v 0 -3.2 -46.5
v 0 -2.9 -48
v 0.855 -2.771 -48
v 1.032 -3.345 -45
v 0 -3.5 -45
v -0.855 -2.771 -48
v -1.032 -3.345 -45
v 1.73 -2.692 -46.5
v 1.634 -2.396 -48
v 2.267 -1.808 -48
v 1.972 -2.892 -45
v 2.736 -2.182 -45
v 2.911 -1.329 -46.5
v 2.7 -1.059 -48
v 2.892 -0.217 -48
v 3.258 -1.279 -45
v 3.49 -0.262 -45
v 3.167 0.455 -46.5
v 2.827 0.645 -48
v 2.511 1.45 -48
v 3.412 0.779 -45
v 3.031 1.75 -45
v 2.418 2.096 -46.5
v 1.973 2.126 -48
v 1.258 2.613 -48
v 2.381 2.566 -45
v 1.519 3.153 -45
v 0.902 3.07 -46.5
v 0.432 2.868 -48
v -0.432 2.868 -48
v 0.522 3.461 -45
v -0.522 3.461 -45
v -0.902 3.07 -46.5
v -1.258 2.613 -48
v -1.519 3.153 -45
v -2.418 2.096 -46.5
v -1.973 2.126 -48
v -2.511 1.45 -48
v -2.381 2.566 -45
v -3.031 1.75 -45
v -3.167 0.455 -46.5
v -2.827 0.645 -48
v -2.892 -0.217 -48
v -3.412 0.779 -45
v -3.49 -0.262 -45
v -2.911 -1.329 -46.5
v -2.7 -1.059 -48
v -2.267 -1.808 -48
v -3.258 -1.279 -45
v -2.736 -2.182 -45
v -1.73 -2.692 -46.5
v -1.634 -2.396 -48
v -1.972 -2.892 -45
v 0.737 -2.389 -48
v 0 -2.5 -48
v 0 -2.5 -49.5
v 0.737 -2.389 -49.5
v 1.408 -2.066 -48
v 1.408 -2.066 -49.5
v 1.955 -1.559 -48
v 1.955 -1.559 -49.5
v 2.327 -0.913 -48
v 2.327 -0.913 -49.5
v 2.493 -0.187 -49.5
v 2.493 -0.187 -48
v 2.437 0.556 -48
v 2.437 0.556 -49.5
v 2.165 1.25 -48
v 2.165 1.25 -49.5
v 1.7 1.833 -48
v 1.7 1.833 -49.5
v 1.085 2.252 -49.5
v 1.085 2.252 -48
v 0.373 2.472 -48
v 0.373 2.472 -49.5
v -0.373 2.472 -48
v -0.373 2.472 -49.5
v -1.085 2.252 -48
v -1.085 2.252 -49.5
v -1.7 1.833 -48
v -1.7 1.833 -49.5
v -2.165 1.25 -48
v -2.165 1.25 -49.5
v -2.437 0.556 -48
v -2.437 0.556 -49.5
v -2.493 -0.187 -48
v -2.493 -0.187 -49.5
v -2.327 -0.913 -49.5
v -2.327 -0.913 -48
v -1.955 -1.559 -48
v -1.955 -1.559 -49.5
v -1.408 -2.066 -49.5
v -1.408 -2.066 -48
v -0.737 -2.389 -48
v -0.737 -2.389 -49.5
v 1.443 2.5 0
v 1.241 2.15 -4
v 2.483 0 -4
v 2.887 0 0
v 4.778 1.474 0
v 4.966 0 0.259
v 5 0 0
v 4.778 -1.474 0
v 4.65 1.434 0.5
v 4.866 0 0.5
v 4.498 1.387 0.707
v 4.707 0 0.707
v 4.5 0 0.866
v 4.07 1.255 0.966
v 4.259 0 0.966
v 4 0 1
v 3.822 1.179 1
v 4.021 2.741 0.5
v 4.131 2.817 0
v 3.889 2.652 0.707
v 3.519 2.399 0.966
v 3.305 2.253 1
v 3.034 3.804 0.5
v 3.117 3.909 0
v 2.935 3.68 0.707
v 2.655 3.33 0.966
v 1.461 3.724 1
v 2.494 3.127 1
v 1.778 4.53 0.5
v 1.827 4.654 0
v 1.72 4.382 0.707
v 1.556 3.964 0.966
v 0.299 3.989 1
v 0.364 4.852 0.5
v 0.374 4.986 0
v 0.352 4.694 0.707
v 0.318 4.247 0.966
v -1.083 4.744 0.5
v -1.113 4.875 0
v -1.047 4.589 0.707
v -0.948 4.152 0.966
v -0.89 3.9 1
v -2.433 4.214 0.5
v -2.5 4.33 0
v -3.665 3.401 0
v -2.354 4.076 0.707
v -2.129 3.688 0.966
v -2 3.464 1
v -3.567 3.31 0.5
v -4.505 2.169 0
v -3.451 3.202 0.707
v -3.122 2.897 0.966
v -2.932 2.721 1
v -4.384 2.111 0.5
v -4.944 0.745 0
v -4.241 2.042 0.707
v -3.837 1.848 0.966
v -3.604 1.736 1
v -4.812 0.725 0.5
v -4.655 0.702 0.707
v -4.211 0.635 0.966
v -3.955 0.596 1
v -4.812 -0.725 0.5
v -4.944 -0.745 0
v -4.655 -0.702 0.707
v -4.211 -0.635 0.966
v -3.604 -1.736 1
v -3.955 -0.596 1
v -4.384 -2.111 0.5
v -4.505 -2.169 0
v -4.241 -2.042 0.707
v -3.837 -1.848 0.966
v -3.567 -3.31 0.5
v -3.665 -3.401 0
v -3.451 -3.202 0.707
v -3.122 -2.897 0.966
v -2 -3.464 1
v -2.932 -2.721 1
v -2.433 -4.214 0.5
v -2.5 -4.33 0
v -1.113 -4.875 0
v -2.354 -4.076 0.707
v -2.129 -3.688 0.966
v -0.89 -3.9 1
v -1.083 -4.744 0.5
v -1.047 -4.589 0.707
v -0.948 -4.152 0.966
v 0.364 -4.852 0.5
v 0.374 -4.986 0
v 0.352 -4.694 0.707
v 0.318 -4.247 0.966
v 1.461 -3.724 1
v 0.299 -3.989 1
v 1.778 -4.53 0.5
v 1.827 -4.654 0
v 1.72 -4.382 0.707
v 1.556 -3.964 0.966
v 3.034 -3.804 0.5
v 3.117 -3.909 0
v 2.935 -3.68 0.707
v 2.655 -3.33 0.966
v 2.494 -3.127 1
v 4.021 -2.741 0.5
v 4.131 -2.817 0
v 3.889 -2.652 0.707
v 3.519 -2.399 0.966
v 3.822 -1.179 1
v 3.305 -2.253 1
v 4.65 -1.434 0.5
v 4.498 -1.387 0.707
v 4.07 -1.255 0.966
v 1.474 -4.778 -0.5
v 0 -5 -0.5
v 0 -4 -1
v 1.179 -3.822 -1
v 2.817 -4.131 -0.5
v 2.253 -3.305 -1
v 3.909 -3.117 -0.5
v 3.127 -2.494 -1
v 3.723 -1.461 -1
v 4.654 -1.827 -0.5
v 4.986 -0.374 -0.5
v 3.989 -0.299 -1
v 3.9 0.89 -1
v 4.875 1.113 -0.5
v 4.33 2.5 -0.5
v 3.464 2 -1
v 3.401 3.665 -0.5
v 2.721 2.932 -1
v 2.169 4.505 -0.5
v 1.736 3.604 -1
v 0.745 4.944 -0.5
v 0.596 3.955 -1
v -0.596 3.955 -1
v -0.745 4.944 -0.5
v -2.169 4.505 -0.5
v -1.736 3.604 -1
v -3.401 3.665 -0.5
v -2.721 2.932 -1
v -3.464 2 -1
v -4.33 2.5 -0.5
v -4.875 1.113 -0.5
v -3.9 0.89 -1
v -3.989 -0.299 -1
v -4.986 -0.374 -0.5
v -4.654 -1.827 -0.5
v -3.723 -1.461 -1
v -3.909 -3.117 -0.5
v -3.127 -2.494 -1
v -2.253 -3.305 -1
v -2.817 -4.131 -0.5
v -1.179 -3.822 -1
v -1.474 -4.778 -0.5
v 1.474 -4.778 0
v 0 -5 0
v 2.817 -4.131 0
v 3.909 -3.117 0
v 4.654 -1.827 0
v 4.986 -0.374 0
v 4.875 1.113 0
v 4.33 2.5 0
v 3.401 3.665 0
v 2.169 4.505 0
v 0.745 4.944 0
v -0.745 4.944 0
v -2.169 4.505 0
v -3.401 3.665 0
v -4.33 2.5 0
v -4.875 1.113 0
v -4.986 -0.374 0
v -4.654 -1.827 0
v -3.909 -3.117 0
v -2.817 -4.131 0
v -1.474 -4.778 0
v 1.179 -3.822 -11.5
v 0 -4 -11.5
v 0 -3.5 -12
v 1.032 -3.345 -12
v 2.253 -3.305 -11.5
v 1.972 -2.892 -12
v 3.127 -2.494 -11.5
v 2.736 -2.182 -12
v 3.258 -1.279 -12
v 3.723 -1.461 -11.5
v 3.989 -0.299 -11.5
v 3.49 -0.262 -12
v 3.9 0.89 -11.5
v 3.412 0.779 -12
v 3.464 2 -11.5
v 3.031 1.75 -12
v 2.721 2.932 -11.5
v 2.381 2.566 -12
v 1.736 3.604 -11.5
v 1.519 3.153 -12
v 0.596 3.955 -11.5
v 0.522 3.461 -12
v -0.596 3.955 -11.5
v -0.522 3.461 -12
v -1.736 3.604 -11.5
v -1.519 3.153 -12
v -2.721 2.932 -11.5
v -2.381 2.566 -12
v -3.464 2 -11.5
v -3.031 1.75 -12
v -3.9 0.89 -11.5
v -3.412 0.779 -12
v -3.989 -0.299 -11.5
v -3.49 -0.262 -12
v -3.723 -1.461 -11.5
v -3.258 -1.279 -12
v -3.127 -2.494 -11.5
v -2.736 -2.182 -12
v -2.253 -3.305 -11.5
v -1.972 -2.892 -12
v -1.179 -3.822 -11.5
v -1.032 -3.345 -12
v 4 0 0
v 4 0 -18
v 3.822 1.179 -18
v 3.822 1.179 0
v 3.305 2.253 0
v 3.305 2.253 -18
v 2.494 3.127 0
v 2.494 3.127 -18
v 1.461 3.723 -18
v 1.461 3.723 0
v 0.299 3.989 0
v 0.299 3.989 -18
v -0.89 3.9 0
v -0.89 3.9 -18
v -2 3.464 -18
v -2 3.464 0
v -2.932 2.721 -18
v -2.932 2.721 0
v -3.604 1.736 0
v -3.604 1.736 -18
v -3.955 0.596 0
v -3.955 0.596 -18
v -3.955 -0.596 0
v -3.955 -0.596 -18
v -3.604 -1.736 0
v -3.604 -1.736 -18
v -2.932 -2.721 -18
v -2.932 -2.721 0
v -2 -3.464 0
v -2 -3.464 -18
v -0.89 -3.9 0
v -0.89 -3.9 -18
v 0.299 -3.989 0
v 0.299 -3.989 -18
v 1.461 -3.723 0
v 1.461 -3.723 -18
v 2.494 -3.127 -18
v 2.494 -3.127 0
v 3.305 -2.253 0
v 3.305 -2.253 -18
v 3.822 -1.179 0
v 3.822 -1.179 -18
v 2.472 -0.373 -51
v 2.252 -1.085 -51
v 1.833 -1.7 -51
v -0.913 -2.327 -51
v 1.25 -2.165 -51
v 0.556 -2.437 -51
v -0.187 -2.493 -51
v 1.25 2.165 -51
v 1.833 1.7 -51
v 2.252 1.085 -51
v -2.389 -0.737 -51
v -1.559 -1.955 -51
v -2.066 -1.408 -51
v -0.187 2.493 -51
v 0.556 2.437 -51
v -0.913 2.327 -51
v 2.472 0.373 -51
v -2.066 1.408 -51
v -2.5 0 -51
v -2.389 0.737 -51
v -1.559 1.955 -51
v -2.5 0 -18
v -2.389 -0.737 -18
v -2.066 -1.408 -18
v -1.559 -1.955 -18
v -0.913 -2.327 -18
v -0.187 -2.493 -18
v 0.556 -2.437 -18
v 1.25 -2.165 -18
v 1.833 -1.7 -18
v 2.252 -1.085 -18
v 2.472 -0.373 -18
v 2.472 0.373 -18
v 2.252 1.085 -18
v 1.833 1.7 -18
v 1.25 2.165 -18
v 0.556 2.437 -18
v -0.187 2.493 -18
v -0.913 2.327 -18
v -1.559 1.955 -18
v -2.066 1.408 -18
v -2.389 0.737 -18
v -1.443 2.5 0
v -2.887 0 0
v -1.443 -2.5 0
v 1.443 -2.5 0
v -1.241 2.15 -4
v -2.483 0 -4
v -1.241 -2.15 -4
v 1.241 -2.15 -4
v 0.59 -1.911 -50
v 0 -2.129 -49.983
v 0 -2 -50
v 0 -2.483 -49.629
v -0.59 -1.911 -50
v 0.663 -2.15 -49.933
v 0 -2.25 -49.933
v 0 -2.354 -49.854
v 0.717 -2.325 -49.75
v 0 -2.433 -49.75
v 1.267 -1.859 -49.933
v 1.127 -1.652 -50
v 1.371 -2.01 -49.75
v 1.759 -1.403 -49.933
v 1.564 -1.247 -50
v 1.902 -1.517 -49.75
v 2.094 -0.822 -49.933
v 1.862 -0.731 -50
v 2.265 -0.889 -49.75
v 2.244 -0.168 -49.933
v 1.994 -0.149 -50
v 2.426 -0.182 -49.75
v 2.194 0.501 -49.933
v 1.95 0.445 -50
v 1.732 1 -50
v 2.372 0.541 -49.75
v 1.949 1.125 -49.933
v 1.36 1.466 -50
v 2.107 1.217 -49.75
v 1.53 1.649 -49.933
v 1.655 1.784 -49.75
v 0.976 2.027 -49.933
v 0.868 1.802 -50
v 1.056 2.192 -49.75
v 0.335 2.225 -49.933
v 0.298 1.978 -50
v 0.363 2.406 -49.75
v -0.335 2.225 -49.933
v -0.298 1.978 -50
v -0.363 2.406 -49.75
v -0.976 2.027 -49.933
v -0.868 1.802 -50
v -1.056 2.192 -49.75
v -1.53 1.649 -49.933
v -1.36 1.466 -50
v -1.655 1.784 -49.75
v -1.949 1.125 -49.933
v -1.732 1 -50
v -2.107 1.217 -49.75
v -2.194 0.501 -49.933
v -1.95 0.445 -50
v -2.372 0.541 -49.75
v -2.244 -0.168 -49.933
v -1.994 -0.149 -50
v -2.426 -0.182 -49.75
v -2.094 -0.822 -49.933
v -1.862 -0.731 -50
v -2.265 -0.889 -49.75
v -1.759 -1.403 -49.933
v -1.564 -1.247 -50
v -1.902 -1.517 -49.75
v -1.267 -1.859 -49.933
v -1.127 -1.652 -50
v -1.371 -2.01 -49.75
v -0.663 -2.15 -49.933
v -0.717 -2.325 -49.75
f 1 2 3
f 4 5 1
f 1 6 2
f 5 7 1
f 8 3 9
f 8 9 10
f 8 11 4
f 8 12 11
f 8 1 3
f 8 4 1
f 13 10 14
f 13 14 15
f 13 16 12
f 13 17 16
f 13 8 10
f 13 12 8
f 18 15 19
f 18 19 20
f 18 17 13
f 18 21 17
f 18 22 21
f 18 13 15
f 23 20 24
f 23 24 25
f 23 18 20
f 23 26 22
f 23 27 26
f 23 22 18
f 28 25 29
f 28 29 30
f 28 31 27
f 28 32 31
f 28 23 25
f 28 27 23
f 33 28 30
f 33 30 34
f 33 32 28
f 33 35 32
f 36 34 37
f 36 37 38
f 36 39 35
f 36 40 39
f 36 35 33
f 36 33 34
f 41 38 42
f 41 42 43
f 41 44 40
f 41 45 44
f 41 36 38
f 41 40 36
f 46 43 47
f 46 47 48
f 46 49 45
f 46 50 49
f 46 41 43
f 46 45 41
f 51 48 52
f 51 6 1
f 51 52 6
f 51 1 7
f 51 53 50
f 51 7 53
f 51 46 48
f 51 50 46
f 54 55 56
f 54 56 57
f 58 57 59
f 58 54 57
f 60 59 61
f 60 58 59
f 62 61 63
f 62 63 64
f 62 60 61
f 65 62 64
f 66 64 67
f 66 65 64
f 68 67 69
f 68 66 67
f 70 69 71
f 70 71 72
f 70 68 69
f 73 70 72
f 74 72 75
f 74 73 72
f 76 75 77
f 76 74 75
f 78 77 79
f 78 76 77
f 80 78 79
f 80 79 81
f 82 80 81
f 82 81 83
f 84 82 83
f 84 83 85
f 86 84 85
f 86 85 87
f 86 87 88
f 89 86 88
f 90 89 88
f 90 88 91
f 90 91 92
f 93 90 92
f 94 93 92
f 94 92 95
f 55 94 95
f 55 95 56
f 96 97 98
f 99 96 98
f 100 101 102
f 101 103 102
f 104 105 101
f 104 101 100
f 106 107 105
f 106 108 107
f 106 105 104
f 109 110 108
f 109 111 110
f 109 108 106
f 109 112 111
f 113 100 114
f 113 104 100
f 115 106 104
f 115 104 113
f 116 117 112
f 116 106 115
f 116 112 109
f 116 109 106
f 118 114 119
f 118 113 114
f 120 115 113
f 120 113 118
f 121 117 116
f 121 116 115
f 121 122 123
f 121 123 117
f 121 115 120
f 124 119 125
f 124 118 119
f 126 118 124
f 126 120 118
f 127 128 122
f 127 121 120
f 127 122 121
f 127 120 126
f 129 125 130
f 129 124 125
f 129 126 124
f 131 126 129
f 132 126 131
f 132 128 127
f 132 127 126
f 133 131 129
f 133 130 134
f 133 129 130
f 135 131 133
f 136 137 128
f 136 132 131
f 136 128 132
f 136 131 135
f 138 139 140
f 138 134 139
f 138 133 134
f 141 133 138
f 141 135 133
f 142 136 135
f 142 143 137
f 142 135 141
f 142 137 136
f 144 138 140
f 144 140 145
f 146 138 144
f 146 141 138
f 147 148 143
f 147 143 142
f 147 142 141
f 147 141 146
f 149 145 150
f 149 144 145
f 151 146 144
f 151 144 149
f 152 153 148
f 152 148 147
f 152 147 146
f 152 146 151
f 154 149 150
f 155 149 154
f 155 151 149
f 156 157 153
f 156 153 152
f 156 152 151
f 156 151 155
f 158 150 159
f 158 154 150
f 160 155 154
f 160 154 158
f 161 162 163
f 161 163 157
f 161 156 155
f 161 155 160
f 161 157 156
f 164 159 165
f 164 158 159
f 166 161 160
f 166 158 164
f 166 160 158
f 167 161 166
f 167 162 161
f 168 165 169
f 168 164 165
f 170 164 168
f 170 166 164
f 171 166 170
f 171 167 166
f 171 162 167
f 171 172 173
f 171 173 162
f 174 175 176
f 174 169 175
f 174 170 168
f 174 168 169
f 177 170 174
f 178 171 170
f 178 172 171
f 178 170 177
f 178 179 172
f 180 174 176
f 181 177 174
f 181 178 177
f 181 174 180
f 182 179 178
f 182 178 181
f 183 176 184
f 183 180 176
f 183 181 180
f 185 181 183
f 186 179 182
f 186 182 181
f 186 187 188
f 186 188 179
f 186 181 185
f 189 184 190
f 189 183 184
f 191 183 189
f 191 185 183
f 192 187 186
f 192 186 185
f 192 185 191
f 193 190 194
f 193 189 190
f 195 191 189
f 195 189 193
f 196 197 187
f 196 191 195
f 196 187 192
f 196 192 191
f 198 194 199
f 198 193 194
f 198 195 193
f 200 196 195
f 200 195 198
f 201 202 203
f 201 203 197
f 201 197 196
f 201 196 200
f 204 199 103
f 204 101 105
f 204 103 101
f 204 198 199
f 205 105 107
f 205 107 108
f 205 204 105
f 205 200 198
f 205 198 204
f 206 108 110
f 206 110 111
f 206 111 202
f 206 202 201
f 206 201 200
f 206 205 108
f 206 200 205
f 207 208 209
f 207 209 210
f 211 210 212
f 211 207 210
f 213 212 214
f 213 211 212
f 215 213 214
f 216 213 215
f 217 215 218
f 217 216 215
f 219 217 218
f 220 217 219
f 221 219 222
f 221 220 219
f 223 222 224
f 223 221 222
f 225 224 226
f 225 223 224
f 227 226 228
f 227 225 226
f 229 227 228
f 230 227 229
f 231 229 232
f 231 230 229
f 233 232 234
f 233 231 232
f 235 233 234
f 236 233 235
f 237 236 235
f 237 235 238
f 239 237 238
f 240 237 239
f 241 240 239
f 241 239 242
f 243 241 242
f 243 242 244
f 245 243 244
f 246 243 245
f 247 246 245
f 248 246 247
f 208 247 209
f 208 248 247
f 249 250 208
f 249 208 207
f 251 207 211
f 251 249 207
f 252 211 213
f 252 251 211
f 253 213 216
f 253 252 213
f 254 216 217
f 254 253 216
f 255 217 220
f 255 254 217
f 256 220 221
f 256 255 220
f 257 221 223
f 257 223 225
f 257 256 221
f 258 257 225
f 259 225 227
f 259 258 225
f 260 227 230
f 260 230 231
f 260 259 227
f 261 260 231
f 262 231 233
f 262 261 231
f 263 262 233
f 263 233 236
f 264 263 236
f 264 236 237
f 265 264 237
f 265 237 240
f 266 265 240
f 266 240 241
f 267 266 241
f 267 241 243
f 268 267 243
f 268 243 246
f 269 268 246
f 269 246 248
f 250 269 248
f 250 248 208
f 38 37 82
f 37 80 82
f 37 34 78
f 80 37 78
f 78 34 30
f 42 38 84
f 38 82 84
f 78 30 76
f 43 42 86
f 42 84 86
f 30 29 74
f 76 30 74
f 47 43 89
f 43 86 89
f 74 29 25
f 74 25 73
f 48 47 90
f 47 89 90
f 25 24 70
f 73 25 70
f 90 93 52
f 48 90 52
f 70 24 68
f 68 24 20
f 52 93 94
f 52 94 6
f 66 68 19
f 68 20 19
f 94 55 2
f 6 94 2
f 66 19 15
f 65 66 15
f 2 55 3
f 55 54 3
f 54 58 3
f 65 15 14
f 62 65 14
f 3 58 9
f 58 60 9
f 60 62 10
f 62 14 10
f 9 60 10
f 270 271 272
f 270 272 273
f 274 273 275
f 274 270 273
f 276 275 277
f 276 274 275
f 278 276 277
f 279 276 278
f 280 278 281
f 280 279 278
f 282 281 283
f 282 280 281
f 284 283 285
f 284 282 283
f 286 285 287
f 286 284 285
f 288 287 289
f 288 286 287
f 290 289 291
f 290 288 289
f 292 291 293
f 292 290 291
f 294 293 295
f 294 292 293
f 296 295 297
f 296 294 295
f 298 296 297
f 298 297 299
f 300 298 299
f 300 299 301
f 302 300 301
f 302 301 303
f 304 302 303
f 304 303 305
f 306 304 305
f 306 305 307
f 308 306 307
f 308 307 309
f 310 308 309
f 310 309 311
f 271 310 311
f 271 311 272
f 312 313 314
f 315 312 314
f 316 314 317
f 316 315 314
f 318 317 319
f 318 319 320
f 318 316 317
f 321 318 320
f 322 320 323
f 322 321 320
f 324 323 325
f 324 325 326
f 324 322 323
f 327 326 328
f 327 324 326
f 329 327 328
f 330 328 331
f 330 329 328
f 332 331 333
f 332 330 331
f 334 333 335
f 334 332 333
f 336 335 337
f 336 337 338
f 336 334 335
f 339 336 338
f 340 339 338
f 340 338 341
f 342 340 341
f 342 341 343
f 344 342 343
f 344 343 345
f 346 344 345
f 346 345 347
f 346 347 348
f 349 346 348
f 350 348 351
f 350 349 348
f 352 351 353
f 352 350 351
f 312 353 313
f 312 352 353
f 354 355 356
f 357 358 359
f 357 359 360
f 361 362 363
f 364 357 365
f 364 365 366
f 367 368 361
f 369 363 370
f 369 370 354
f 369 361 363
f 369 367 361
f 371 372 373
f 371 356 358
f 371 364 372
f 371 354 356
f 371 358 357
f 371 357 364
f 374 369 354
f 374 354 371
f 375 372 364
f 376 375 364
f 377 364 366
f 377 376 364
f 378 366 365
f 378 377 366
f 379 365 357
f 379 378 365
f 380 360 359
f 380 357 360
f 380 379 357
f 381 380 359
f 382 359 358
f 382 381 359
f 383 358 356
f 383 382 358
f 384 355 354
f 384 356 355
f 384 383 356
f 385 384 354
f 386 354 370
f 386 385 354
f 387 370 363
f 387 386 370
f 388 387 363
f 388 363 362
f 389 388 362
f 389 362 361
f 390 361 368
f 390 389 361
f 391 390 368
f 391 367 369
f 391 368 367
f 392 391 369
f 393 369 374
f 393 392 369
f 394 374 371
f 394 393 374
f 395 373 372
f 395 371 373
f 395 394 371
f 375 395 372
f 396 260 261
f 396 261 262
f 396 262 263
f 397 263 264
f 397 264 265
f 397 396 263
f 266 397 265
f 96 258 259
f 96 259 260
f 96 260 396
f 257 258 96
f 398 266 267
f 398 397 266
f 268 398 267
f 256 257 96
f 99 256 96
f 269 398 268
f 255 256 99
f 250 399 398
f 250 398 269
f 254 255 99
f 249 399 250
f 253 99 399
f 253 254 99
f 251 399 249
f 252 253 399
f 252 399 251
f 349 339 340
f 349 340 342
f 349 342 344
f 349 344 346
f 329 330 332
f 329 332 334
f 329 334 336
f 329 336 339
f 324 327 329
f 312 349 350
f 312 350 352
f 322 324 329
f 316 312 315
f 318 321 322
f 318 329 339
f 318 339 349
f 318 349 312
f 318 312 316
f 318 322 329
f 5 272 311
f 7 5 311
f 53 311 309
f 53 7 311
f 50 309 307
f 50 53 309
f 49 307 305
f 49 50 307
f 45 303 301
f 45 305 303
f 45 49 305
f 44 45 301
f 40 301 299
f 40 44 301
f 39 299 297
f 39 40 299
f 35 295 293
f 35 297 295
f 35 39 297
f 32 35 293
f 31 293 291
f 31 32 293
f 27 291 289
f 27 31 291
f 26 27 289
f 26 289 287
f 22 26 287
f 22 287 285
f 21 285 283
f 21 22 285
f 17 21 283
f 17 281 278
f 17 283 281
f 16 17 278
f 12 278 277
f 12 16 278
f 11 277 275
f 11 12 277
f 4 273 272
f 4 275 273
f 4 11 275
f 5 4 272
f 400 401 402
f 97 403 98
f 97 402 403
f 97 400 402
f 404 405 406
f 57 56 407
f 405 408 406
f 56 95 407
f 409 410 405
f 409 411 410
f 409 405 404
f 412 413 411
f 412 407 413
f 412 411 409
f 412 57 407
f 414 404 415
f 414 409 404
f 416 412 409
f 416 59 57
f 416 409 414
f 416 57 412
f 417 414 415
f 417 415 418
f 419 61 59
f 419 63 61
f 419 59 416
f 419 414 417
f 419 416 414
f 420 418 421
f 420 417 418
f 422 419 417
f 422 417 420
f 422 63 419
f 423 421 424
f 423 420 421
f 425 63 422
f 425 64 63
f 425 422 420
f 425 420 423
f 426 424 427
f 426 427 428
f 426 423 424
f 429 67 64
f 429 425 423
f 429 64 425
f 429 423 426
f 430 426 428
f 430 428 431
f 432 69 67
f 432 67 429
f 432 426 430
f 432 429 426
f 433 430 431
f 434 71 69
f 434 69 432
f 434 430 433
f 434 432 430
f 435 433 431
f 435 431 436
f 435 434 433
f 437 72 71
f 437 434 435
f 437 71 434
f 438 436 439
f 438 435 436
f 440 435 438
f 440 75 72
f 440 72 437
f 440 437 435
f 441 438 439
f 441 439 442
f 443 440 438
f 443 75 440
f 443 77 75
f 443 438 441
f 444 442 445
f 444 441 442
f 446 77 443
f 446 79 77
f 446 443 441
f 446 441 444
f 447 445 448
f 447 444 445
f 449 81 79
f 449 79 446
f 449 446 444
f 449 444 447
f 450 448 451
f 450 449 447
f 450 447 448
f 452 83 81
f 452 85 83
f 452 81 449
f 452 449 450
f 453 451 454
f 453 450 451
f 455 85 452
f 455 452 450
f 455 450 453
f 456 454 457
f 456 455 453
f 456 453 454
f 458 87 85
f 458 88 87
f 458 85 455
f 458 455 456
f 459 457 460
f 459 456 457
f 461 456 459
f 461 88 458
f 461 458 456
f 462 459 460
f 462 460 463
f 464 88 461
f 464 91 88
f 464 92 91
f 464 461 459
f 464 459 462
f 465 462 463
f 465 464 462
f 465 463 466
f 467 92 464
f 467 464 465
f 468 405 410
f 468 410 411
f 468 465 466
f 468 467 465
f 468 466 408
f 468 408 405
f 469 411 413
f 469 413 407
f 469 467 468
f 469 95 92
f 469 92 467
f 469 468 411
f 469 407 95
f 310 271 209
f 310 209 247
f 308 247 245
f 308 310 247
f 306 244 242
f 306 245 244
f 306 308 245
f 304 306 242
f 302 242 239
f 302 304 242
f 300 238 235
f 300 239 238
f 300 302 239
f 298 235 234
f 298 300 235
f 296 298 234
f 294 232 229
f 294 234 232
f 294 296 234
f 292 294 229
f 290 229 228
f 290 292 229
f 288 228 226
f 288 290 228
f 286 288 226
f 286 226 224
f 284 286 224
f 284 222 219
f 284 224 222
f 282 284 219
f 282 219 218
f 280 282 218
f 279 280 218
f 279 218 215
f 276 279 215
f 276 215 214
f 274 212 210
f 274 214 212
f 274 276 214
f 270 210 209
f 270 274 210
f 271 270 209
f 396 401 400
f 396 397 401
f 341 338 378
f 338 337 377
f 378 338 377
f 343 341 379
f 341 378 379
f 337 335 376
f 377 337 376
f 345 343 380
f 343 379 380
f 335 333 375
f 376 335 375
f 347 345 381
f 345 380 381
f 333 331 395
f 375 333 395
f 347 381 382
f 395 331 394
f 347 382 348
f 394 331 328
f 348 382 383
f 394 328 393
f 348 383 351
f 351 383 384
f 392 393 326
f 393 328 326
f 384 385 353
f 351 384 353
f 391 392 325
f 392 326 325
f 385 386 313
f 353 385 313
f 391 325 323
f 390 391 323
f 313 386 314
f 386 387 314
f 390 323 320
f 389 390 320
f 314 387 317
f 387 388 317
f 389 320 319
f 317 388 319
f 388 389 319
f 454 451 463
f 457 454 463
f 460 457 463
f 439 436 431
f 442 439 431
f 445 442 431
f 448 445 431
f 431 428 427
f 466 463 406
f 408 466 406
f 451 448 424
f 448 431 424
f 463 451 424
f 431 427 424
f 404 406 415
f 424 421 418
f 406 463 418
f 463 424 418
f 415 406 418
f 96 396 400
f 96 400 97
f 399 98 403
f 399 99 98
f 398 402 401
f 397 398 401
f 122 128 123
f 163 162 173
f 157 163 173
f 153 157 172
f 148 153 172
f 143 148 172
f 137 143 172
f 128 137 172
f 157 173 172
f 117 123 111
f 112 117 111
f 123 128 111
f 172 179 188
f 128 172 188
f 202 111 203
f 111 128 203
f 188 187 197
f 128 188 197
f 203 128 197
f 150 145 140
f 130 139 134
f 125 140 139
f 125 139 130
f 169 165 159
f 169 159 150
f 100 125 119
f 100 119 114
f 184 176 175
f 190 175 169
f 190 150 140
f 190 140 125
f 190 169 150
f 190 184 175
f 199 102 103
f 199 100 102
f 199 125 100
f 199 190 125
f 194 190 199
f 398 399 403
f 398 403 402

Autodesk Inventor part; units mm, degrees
ref_plane "YZ Plane" through (0, 0, 0) normal (1, 0, 0) x (0, 1, 0)
ref_plane "XZ Plane" through (0, 0, 0) normal (0, 1, 0) x (-1, 0, 0)
ref_plane "XY Plane" through (0, 0, 0) normal (0, 0, 1) x (1, 0, 0)
sketch "Sketch2" plane through (0, 0, 0) normal (1, 0, 0) x (0, 1, 0)
  line L0 (0, 0) -> (-5, 0)
  line L1 (-5, -0.5) -> (-4, -1)
  line L2 (-3.5, -12) -> (-3.5, -45)
  line L3 (-3.5, -45) -> (-2.9, -48)
  line L4 (0, -50) -> (0, 0)
  line L5 (-5, -0.5) -> (-5, 0)
  line L6 (-2.5, -50) -> (0, -50)
  line L7 (-2.5, -50) -> (-2.5, -48)
  line L8 (-2.5, -48) -> (-2.9, -48)
  line L9 (-4, -1) -> (-4, -11.5)
  line L10 (-3.5, -12) -> (-4, -11.5)
  dimension "d0" = 10
  dimension "d1" = 5
  dimension "d2" = 7
  dimension "d3" = 3
  dimension "d4" = 2
  dimension "d5" = 0.6
  dimension "Length" = 50
  dimension "d7" = 8
  dimension "d9" = 0.5
  dimension "d10" = 1
  dimension "d17" = 12
  dimension "d18" = 135
revolve "Revolution1" add sketch "Sketch2" angle 360 about axis through (0, 0, -50) along (0, 0, 1)
thread "Thread1" size "TR8x1.5" class "7e" standard "ISO Metric Trapezoidal Threads" full length
sketch "Sketch3" plane through (0, 0, 0) normal (0, 0, 1) x (1, 0, 0)
  circle A0 centre (0, 0) radius 5 projected
  circle A1 centre (0, 0) radius 2.5 construction
  line L0 (1.4434, 2.5) -> (2.8868, 0)
  line L1 (2.8868, 0) -> (1.4434, -2.5)
  line L2 (1.4434, -2.5) -> (-1.4434, -2.5)
  line L3 (-1.4434, -2.5) -> (-2.8868, 0)
  line L4 (-2.8868, 0) -> (-1.4434, 2.5)
  line L5 (-1.4434, 2.5) -> (1.4434, 2.5)
  point P0 (0, 2.5)
  dimension "d14" = 5
extrude "Extrusion1" cut sketch "Sketch3" against normal blind 4 draft -5 contours L0 L1 L2 L3 L4 L5
fillet "Fillet1" radius 0.5 1 edges at (0, 2.5, -50)
sketch "Sketch4" plane through (0, 0, 0) normal (0, 0, 1) x (1, 0, 0)
  circle A0 centre (0, 0) radius 5 construction
  circle A1 centre (0, 0) radius 4
  dimension "d20" = 8
extrude "Extrusion2" add sketch "Sketch4" against normal blind 18 separate body
sketch "Sketch5" plane through (0, 0, -18) normal (0, 0, -1) x (-1, 0, 0)
  circle A0 centre (0, 0) radius 4 projected
  circle A1 centre (0, 0) radius 2.5
  dimension "d23" = 5
extrude "Extrusion3" add sketch "Sketch5" along normal blind 33 contours A1 bodies 2
sketch "Sketch6" plane through (0, 0, 0) normal (0, 1, 0) x (-1, 0, 0)
  line L0 (0, 0) -> (-5, 0)
  line L1 (-5, 0) -> (-5, 1)
  line L2 (-5, 1) -> (0, 1)
  line L3 (0, 1) -> (0, 0)
  dimension "d26" = 10
  dimension "d27" = 1
revolve "Revolution2" add sketch "Sketch6" angle 360 about axis through (0, 0, 1) along (0, 0, -1) separate body
fillet "Fillet2" radius 1 1 edges at (-5, 0, 1)
equation "\"Pillar_Board_Thickness\" = 18"
equation "\"d31\" = -0.5 * Pillar_Board_Thickness"
properties part number "Confirmat L50 & Cap D10 NB T18 PB T 18" material "Nickel-Copper Alloy 400"
